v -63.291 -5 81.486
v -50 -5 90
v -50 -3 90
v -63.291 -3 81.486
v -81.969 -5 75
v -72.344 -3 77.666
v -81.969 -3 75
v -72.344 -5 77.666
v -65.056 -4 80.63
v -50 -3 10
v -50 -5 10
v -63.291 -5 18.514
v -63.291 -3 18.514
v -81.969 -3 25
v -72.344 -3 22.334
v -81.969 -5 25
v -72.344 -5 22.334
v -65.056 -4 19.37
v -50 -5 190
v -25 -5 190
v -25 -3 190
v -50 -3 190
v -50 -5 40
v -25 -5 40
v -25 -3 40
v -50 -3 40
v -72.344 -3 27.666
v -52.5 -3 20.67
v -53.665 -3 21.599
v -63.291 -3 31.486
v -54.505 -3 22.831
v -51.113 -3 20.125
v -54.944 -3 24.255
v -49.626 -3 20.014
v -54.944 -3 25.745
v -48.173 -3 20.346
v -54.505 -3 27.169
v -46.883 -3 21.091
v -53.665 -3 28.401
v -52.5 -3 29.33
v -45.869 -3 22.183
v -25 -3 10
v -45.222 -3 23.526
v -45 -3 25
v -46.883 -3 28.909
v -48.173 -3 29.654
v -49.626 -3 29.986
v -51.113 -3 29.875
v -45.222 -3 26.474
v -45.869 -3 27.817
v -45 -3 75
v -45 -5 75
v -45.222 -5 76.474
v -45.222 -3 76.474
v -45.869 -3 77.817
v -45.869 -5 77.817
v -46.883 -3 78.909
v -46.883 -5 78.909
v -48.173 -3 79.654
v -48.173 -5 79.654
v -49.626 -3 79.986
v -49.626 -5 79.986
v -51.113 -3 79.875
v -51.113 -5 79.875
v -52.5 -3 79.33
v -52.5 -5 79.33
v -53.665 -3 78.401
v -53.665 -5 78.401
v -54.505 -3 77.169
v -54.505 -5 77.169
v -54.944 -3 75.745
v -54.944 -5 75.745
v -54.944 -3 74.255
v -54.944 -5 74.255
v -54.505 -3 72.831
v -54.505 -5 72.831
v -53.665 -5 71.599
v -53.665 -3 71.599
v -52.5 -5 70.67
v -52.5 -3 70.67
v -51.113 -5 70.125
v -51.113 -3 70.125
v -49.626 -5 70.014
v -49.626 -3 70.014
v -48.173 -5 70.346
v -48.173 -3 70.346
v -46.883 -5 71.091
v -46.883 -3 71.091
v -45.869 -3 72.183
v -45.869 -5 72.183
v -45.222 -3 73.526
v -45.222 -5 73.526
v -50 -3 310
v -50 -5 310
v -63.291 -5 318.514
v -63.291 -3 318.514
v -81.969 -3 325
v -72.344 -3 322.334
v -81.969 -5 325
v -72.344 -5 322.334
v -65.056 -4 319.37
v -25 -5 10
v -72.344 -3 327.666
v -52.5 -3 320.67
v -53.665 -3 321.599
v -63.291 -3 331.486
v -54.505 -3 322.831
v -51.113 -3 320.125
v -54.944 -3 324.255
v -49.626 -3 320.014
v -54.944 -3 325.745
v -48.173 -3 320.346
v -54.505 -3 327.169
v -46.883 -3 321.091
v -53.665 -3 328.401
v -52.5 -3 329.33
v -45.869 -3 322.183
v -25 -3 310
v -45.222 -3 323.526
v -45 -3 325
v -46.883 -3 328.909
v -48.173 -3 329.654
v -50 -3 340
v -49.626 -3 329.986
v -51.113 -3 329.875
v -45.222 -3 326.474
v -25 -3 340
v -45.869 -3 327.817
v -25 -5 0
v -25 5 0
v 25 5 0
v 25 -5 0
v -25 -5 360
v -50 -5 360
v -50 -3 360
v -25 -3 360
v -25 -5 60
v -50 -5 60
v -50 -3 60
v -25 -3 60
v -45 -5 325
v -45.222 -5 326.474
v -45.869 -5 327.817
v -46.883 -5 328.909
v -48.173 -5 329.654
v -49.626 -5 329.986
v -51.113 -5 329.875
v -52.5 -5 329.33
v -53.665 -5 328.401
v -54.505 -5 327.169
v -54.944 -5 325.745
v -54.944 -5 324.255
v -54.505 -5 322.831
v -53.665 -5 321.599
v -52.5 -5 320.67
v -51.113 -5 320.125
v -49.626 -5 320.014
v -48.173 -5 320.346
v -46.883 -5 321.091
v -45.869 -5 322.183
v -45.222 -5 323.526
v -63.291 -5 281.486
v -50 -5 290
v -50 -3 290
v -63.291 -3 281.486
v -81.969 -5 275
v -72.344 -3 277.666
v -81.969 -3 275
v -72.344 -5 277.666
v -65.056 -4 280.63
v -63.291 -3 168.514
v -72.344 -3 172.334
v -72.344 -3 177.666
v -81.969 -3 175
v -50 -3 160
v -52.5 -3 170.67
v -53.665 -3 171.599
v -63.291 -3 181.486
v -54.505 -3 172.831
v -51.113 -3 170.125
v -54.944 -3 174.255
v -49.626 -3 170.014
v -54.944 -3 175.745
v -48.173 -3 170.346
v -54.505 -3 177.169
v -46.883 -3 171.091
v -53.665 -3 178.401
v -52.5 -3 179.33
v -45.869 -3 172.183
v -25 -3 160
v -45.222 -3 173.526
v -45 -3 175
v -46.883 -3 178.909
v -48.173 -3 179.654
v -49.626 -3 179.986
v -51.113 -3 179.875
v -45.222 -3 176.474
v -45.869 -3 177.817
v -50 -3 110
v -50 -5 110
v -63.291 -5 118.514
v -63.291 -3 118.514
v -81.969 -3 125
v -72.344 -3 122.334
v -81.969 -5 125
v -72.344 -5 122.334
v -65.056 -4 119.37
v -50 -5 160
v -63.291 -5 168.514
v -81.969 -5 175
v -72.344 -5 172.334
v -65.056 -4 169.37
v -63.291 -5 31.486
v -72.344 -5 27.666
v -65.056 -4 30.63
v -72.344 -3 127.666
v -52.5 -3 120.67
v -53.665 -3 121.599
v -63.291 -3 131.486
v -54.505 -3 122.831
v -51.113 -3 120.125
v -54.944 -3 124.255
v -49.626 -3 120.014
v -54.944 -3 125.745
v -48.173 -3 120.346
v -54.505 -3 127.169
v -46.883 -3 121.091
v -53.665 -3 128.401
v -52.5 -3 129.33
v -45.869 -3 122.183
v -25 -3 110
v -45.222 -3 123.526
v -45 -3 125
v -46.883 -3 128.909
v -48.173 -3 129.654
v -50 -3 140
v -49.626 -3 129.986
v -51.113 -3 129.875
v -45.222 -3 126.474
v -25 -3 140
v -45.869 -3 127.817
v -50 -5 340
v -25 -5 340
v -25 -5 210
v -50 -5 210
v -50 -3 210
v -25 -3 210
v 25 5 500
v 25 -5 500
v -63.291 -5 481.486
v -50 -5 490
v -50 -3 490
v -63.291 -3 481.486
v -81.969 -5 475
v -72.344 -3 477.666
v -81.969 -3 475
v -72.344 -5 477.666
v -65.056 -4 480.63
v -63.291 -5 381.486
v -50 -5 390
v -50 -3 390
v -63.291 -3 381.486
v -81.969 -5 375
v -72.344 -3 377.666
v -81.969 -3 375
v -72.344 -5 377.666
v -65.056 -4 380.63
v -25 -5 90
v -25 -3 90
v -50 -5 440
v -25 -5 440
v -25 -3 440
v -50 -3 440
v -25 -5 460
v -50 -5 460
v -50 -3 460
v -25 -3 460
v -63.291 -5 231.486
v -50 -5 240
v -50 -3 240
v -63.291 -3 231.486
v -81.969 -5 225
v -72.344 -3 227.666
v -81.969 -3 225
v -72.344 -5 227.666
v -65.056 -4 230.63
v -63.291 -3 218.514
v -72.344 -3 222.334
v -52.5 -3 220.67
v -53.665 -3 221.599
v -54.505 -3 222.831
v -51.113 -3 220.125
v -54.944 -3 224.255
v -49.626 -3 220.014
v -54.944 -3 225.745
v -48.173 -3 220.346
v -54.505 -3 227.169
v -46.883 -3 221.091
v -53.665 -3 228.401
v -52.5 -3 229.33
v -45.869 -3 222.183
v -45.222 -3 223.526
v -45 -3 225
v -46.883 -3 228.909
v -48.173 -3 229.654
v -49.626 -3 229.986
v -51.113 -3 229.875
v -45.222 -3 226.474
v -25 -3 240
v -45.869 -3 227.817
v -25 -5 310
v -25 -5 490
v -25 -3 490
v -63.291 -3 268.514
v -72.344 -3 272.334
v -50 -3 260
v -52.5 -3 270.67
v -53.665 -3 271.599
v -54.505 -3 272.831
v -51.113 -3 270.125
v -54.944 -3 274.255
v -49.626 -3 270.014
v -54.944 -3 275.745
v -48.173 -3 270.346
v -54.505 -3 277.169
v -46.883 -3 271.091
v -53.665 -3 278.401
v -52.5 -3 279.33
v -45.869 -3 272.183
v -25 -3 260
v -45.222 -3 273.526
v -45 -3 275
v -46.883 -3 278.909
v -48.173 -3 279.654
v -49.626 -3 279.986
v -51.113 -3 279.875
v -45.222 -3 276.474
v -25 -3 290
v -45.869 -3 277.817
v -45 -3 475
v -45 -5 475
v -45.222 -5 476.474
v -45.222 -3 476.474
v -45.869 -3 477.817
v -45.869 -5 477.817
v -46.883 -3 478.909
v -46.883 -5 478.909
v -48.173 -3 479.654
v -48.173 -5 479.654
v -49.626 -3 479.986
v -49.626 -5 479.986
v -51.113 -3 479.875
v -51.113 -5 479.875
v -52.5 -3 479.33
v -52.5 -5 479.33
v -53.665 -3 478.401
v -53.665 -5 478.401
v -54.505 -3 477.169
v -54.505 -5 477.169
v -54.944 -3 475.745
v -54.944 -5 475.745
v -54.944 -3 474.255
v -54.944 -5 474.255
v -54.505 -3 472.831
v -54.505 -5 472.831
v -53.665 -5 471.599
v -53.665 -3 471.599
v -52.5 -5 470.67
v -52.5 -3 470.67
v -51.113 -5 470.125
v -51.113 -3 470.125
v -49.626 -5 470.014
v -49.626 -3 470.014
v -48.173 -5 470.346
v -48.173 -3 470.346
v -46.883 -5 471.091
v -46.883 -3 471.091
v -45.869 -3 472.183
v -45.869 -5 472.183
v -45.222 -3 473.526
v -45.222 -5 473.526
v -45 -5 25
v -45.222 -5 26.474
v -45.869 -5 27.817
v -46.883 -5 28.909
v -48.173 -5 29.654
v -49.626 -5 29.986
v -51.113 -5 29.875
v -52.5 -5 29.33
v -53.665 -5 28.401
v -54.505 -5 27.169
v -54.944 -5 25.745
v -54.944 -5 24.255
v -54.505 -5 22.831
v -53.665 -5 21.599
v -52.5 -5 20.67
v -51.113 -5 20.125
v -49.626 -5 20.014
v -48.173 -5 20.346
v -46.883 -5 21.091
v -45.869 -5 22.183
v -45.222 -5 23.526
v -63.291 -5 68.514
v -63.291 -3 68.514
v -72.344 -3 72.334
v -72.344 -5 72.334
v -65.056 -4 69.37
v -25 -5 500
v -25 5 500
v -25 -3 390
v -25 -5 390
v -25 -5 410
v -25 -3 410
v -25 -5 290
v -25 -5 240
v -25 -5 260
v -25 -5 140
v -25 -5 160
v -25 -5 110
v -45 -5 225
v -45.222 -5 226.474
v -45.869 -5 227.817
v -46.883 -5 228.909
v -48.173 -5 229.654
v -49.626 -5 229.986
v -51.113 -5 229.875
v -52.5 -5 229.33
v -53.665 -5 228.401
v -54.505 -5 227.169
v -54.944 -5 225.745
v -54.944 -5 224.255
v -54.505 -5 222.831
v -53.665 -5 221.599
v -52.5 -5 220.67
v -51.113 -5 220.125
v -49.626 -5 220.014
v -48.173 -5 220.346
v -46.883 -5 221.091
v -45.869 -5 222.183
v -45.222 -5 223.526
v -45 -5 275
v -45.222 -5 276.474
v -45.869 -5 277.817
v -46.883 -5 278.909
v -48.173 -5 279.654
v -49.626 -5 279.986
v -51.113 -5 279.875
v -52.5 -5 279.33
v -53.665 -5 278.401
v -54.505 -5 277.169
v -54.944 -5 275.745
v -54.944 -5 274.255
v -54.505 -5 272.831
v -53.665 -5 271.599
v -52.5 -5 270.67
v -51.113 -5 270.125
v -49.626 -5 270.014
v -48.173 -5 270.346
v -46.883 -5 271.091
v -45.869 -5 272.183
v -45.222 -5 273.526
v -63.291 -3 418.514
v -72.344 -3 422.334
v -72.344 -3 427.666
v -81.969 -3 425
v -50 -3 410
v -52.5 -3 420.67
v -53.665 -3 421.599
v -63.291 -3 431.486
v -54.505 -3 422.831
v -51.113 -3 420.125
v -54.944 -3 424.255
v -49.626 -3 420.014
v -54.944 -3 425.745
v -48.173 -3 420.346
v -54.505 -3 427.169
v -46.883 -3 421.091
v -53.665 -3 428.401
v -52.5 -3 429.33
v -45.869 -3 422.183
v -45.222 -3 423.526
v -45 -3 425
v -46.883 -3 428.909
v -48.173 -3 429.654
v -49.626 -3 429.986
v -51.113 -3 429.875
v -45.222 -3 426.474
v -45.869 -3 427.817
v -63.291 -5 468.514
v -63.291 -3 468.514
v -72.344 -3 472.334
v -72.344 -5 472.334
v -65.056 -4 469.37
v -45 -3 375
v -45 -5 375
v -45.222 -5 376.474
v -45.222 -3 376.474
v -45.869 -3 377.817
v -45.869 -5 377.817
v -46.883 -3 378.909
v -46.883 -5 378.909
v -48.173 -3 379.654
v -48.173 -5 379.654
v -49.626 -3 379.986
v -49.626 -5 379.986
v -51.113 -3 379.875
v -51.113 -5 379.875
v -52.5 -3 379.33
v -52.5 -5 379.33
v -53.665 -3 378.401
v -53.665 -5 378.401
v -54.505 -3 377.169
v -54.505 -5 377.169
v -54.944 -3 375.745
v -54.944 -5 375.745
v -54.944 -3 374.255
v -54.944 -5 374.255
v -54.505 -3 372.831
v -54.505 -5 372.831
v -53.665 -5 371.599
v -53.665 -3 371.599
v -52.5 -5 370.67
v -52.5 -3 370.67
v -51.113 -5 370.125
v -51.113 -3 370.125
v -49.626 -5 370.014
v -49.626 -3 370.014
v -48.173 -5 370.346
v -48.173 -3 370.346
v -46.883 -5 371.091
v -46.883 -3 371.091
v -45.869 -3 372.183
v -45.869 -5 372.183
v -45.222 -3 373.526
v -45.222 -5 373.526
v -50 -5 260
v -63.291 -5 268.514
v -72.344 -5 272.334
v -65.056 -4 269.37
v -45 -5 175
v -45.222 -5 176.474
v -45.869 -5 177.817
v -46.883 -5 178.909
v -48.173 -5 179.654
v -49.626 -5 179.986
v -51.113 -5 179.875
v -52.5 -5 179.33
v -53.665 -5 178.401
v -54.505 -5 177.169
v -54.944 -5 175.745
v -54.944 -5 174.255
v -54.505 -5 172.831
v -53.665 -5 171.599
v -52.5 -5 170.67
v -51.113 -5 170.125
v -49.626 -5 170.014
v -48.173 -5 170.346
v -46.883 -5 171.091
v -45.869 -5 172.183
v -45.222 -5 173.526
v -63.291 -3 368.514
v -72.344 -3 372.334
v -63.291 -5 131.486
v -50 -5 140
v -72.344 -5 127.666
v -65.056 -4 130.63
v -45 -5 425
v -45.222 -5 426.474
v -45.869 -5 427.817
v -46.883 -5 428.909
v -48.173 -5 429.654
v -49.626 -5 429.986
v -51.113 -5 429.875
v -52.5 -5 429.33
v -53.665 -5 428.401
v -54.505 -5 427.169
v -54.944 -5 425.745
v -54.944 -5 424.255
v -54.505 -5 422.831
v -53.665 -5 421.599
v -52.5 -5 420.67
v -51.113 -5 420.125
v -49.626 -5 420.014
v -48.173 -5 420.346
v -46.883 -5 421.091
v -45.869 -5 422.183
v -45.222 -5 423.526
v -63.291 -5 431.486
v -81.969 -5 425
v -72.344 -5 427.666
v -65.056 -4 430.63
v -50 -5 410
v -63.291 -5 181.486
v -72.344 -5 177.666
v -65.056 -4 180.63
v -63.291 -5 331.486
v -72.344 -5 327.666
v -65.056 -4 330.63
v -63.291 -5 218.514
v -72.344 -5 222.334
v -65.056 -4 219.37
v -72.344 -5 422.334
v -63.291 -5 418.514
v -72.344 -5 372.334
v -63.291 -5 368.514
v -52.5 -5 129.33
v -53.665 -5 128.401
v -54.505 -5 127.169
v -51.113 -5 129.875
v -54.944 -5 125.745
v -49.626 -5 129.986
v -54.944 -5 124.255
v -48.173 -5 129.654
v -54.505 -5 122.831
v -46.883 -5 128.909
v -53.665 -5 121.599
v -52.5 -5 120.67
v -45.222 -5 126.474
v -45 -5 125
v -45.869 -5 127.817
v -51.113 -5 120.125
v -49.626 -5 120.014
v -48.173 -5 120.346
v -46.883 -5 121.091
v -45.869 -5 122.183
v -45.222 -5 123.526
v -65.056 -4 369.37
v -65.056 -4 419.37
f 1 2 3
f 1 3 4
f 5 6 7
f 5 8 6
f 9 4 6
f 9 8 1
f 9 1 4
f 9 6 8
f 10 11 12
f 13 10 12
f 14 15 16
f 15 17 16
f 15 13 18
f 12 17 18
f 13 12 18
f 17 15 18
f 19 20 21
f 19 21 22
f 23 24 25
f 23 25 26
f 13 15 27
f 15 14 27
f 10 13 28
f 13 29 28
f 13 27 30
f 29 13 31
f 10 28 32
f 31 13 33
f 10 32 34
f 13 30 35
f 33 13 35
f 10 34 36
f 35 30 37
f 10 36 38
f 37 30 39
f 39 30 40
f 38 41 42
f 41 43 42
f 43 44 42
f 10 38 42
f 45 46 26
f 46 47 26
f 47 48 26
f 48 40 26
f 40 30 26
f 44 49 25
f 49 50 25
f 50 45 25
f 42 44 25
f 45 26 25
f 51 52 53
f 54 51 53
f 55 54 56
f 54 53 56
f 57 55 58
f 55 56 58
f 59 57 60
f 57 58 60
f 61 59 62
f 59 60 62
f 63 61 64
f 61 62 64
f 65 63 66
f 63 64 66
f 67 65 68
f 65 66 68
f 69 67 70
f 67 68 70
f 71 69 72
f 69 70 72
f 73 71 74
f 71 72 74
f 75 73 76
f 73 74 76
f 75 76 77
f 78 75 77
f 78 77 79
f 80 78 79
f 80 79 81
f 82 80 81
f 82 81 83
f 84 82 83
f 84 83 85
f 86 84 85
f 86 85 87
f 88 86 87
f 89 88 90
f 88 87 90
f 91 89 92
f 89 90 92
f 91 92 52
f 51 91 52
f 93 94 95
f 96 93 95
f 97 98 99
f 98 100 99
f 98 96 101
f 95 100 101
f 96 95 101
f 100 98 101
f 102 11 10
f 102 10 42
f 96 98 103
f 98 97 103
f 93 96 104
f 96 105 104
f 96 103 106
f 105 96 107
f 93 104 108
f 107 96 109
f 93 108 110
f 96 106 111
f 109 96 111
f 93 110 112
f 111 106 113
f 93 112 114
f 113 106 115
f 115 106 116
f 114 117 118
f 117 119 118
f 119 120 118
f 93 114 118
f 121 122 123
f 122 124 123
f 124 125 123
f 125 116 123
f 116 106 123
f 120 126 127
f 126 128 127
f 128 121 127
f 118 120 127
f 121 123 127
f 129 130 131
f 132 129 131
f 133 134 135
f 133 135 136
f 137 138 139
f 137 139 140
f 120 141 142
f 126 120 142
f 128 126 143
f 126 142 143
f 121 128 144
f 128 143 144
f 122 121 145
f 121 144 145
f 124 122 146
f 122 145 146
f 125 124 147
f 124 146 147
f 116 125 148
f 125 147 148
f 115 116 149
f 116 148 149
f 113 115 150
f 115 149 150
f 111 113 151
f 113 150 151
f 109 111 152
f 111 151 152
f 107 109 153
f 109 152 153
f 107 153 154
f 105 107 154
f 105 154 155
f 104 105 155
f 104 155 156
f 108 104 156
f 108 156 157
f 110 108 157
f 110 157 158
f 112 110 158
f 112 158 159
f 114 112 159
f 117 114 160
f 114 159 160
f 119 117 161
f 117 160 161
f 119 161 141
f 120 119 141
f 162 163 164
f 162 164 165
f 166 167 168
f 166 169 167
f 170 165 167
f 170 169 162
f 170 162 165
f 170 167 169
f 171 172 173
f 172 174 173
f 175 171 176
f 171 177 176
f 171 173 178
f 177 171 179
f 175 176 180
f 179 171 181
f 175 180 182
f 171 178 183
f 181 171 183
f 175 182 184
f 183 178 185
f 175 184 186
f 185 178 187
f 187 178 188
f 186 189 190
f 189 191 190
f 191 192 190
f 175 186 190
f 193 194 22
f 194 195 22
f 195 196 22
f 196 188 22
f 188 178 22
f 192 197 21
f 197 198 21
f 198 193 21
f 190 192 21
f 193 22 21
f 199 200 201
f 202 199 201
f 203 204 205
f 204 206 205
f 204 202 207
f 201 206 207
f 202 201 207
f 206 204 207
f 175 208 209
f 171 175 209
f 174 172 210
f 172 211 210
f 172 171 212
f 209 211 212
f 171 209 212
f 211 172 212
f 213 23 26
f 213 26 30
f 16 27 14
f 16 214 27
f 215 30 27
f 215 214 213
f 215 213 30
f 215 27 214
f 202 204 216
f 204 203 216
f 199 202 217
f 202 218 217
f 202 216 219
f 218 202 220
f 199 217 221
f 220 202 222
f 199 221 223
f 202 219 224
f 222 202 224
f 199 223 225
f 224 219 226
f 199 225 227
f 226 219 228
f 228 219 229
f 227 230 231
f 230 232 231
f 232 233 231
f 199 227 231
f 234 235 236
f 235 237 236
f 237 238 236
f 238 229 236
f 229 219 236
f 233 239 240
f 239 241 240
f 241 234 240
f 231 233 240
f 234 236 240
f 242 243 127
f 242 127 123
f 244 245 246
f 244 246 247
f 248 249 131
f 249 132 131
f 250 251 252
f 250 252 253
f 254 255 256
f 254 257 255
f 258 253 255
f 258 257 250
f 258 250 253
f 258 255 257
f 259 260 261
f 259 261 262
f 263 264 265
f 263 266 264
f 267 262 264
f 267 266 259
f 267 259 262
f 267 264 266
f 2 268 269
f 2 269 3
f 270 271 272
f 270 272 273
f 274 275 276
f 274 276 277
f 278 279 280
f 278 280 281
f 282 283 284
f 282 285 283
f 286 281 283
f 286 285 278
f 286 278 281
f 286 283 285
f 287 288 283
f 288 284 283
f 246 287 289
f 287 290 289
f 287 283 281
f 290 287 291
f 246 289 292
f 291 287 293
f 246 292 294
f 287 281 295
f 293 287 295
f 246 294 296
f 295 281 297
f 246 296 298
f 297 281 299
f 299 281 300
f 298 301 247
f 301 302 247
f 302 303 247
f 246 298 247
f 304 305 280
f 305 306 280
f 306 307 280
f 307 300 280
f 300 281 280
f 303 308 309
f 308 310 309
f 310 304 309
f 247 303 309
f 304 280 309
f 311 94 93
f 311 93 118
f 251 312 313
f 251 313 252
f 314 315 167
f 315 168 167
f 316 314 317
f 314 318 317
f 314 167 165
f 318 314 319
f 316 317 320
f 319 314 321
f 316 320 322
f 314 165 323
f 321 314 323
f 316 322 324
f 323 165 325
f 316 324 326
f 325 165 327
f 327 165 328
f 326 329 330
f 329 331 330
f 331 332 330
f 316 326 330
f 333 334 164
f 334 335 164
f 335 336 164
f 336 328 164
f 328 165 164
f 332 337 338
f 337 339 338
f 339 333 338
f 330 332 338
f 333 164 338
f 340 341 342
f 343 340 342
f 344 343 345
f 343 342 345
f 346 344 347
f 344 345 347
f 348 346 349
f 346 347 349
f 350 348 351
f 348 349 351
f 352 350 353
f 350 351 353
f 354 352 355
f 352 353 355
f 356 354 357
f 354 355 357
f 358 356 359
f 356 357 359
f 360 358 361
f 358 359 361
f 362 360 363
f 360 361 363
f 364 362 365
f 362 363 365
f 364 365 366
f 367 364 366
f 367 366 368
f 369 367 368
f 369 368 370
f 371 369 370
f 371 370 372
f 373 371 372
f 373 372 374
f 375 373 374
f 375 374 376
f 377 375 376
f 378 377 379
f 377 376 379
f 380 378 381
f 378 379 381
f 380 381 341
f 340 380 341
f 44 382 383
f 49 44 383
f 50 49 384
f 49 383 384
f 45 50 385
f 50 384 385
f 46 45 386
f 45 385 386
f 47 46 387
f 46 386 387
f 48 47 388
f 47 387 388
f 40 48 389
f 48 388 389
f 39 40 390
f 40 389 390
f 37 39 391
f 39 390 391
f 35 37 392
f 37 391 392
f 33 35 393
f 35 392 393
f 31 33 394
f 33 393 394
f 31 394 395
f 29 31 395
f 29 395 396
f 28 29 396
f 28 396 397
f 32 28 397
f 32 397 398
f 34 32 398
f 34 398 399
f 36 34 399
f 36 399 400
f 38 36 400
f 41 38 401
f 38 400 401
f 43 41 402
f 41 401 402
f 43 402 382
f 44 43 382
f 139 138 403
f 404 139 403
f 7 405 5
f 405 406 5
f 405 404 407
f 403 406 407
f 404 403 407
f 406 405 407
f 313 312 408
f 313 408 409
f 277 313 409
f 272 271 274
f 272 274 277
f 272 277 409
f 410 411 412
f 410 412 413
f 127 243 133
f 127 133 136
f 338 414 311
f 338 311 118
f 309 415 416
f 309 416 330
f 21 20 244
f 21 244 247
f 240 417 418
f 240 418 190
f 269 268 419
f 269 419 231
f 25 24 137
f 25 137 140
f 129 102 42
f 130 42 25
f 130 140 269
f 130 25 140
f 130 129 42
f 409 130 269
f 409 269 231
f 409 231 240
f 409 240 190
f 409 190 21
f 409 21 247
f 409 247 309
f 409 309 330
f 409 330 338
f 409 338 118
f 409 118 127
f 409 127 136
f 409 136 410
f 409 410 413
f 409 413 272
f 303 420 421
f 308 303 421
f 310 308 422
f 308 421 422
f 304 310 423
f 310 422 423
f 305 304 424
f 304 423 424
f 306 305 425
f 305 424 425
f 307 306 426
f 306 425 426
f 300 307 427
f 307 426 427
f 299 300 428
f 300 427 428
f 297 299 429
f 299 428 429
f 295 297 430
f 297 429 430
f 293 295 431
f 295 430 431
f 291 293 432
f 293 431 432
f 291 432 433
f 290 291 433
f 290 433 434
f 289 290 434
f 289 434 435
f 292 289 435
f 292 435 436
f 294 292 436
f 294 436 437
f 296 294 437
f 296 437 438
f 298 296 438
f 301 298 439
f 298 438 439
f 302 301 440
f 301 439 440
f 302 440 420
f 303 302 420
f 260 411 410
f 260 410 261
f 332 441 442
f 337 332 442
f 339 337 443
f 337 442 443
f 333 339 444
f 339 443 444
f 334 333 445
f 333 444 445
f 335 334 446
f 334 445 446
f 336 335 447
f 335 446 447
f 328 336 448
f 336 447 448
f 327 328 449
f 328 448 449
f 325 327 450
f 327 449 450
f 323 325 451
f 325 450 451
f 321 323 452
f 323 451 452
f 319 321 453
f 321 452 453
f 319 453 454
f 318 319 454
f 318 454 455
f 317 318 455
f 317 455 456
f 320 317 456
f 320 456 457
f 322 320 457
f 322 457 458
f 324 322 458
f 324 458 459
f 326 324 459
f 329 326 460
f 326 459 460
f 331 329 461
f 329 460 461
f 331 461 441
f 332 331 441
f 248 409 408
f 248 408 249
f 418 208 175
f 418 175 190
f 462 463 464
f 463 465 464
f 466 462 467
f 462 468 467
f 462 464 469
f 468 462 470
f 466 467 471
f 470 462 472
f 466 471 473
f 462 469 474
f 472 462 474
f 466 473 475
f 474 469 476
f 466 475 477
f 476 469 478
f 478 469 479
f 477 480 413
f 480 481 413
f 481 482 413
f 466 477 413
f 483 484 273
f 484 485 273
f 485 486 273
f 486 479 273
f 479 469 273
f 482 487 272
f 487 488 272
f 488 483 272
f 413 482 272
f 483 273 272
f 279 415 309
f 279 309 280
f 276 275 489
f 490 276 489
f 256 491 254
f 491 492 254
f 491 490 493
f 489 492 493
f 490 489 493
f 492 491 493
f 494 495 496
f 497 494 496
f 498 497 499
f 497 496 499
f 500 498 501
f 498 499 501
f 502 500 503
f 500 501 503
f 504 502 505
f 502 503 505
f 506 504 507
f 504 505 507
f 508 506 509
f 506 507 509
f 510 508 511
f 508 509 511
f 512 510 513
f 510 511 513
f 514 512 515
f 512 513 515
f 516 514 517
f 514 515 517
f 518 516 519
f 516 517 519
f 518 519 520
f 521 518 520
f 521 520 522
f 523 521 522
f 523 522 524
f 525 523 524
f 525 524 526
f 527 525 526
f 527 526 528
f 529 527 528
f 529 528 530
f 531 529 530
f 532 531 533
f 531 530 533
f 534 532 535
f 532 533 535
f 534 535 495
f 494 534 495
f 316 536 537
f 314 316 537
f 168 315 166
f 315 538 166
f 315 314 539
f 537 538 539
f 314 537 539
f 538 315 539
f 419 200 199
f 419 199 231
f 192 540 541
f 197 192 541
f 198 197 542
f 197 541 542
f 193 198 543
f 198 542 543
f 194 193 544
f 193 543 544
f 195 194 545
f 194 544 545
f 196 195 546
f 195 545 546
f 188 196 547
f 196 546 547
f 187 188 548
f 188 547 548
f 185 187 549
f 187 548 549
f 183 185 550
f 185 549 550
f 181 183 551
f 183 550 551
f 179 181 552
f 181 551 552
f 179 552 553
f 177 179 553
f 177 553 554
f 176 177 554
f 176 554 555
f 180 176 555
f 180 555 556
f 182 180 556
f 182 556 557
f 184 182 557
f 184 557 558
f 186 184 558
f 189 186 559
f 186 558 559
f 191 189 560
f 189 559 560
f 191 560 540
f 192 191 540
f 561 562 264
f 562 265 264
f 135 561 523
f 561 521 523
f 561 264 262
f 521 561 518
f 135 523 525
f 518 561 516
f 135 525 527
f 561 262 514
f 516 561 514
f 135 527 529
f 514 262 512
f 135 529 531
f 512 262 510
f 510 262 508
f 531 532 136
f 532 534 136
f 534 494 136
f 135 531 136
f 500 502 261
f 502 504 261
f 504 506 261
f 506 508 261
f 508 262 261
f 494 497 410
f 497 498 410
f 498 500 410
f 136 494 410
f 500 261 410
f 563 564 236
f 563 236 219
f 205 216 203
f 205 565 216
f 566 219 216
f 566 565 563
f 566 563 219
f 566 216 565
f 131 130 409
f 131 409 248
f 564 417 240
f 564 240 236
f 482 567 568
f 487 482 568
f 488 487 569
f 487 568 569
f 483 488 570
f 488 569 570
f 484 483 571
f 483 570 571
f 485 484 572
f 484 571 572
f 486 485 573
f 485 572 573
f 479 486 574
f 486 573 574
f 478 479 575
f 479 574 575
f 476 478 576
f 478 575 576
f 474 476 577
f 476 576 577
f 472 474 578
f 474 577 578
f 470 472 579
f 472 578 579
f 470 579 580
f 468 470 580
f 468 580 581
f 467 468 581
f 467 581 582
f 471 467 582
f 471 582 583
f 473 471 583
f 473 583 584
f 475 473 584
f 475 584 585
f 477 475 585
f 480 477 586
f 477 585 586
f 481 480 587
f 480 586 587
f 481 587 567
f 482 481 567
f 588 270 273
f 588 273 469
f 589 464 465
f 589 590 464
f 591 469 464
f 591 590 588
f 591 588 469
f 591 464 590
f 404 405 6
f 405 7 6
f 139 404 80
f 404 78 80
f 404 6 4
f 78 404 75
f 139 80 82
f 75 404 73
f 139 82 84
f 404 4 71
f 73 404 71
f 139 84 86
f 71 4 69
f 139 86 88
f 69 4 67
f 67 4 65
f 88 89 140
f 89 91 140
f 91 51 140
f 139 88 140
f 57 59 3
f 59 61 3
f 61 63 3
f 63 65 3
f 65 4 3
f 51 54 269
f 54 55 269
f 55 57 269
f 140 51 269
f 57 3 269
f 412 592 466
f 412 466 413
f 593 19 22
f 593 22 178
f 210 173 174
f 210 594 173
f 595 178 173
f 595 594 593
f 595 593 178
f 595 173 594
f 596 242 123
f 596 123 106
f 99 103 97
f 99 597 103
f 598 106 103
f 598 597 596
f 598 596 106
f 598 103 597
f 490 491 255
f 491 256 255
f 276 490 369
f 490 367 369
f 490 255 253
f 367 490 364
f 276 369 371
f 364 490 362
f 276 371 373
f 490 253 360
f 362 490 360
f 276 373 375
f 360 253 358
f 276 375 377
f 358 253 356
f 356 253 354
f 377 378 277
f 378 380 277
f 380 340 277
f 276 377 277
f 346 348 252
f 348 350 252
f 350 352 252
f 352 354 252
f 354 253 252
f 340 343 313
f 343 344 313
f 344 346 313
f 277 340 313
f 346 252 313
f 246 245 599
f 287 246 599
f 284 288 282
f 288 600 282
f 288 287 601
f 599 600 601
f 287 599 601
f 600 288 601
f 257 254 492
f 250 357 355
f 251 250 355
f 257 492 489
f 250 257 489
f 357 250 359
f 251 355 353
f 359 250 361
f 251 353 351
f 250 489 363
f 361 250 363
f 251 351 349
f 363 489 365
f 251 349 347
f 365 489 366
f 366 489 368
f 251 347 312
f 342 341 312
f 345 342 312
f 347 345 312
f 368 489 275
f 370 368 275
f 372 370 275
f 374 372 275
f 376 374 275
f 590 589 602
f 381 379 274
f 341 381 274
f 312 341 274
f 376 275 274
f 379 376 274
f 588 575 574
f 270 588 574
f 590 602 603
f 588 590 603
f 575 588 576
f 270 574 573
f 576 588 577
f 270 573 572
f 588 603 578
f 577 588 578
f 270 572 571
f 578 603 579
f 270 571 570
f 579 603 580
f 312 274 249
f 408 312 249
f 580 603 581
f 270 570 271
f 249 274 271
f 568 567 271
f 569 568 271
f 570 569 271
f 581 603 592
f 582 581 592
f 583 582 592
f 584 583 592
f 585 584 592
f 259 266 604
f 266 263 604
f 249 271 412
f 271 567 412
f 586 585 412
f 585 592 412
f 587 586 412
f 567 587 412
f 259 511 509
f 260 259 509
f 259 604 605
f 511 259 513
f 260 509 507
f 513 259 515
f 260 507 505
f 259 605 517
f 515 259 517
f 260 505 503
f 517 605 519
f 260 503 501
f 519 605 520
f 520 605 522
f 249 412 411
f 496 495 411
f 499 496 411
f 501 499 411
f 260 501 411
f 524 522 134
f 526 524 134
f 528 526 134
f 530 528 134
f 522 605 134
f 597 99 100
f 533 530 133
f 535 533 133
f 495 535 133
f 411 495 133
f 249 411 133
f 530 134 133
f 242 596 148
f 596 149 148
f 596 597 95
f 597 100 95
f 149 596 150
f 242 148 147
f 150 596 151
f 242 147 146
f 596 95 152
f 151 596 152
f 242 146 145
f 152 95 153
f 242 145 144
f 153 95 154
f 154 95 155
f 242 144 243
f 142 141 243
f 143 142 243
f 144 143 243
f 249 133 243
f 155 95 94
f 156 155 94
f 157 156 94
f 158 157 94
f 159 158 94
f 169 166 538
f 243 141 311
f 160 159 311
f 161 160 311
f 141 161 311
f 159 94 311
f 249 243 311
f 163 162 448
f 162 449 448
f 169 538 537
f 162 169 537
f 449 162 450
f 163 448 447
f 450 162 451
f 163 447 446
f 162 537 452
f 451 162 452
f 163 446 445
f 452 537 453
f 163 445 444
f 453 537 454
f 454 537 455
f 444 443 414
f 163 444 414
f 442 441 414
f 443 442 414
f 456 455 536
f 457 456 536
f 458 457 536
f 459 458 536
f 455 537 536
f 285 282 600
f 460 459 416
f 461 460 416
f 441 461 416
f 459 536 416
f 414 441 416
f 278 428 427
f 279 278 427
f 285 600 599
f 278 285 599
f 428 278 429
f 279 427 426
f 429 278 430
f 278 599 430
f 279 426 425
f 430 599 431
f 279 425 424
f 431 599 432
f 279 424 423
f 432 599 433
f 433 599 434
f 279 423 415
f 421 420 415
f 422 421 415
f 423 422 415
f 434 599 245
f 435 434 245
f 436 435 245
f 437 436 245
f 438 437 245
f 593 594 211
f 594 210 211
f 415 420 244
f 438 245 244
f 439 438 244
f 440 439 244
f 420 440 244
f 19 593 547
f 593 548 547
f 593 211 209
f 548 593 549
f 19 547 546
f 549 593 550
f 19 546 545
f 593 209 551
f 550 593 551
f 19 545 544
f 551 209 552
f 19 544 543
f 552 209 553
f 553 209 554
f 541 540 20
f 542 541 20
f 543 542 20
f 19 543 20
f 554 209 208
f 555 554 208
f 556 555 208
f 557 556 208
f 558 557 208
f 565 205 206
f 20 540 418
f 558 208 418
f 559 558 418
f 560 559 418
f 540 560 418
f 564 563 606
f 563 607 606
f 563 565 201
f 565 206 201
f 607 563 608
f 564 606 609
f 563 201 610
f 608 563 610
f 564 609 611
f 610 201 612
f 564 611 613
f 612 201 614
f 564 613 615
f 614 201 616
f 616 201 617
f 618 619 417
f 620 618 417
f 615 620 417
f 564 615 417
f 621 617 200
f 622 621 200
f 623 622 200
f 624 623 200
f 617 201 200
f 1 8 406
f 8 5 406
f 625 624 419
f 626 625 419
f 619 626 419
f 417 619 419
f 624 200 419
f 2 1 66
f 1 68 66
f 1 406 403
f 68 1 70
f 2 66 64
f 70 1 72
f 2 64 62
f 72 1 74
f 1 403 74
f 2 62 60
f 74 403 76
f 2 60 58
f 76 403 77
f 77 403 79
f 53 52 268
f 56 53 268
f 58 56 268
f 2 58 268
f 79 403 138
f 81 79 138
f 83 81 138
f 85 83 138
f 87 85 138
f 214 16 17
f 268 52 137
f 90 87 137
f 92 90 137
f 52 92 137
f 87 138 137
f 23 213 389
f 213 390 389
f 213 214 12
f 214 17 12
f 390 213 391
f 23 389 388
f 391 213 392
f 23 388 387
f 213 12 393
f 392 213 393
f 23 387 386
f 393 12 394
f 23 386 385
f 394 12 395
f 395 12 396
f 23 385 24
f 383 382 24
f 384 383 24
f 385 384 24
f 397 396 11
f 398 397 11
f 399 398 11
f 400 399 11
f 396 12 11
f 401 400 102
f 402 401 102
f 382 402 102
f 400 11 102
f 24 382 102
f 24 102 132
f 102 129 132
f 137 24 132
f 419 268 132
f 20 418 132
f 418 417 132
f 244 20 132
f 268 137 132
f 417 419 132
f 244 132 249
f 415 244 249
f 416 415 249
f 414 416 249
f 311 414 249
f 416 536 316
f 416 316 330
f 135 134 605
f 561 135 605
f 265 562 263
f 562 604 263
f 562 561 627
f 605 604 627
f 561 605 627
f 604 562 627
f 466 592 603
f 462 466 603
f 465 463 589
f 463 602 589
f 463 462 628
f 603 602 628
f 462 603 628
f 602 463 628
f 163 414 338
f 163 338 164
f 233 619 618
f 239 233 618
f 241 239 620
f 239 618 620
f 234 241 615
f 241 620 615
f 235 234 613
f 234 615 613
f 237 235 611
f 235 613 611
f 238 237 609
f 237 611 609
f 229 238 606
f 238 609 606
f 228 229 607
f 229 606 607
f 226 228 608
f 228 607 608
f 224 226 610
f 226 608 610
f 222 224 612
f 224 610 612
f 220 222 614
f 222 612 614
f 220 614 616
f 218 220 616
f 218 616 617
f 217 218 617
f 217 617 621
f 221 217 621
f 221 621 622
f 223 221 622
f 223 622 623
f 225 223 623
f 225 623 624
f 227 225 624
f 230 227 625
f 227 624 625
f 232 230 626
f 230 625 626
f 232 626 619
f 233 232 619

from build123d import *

# Parameters (mm, degrees)
SKETCH1_W           = 50
SKETCH1_H           = 10
BOSS_EXTRUDE1_DEPTH = 50
SKETCH2_R           = 5
BOSS_EXTRUDE2_DEPTH = 2
LPATTERN1_COUNT     = 10
LPATTERN1_PITCH     = 50


with BuildPart() as part:
    # Sketch1 → Boss-Extrude1 (new body)
    with BuildSketch(Plane.XY):
        Rectangle(SKETCH1_W, SKETCH1_H)
    boss_extrude1 = extrude(amount=BOSS_EXTRUDE1_DEPTH)

    # Sketch2 → Boss-Extrude2 (add)
    with BuildSketch(Plane.XZ.offset(5)):
        with BuildLine():
            Line((-50, 10), (-25, 10))
            Line((-25, 10), (-25, 40))
            Line((-25, 40), (-50, 40))
            add(Edge.make_bspline(
                [(-50, 40), (-64.127186128, 28.759951739), (-81.969053702, 25)],
                knots=[0, 0, 0, 1, 1, 1], degree=2))
            add(Edge.make_bspline(
                [(-50, 10), (-64.127186128, 21.240048261), (-81.969053702, 25)],
                knots=[0, 0, 0, 1, 1, 1], degree=2))
        make_face()
        with Locations((-50, 25)):
            Circle(SKETCH2_R, mode=Mode.SUBTRACT)
    boss_extrude2 = extrude(amount=-BOSS_EXTRUDE2_DEPTH)

    # LPattern1: Boss-Extrude1, Boss-Extrude2 ×10
    with Locations(*[(0, 0, i * LPATTERN1_PITCH) for i in range(1, LPATTERN1_COUNT)]):
        add(boss_extrude1)
        add(boss_extrude2)


solid = part.part
